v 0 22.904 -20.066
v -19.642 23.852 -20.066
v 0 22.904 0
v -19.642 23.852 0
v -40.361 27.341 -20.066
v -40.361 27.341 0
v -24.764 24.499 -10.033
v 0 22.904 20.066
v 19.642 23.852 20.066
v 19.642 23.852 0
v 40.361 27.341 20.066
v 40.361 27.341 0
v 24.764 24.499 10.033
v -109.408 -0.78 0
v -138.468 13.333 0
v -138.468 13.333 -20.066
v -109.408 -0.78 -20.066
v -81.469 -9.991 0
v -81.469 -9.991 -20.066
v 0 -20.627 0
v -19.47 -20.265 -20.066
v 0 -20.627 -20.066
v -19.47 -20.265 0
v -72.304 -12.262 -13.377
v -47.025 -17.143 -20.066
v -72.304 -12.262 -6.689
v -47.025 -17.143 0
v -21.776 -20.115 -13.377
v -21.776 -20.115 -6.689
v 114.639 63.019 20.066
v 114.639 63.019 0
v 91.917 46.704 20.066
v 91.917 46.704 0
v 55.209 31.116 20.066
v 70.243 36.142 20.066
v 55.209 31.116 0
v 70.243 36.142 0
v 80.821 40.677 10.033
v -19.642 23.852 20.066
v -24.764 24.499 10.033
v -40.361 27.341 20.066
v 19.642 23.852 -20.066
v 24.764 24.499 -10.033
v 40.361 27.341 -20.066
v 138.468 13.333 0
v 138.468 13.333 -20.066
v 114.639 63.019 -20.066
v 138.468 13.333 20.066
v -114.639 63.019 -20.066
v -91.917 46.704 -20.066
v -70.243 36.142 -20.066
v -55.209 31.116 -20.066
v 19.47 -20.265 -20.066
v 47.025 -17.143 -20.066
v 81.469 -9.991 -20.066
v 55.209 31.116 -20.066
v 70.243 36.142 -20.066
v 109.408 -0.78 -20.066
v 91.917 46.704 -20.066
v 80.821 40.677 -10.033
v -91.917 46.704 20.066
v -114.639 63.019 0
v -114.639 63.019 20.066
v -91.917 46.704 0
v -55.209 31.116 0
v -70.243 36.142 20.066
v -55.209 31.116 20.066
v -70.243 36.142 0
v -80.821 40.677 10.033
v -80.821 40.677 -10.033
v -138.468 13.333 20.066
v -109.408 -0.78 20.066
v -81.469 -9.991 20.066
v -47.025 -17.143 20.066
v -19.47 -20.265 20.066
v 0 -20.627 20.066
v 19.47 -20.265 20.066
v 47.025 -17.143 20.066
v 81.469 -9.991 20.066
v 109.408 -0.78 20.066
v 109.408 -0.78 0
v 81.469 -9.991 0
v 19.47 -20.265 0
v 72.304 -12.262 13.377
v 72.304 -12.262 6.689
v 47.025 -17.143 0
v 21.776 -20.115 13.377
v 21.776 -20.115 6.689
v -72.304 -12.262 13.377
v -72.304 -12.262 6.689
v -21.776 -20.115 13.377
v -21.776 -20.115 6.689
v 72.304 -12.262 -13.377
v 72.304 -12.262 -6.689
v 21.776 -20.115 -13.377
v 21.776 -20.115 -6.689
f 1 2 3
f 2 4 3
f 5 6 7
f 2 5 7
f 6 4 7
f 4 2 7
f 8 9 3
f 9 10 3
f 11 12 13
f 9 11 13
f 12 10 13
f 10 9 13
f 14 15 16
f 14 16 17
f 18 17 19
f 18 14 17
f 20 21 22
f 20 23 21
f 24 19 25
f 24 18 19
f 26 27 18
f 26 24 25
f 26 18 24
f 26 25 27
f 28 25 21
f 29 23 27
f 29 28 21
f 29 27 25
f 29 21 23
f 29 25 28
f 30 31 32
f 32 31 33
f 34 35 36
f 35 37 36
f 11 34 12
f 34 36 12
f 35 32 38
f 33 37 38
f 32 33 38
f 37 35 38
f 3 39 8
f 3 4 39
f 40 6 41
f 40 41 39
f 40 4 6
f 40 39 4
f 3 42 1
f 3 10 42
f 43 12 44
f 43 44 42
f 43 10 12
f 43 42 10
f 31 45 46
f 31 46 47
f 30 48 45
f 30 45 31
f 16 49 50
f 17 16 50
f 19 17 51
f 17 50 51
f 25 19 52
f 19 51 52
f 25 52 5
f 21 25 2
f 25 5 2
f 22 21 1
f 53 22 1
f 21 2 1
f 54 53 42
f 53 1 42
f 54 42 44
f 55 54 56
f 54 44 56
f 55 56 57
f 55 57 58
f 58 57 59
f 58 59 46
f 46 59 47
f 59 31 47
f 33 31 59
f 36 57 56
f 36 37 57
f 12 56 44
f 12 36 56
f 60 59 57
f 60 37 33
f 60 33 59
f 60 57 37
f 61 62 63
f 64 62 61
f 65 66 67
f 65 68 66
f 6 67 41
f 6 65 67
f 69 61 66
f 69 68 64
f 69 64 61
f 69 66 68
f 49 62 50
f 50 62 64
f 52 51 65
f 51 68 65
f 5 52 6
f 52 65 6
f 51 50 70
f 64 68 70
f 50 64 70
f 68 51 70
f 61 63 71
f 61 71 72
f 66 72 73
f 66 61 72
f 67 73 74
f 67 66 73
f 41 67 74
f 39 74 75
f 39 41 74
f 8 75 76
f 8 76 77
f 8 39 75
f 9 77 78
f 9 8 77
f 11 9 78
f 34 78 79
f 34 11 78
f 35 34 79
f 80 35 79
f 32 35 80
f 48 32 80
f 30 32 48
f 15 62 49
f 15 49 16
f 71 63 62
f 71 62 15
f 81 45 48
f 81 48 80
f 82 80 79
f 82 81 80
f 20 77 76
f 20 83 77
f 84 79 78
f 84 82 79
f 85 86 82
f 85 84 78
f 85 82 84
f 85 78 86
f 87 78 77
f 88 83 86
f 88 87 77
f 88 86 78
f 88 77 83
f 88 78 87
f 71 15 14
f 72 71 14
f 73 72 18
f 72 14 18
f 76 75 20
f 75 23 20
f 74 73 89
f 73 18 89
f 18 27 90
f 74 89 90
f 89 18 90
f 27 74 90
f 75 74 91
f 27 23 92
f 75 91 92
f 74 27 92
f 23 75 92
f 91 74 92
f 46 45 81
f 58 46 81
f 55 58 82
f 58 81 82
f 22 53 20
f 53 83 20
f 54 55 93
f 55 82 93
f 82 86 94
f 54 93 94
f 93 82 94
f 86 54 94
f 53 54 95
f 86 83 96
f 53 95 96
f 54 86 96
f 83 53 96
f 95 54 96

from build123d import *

# Parameters (mm, degrees)
F1_DEPTH = 20.066


with BuildPart() as f1:
    # F0 (on Top) → F1 (new body, symmetric)
    with BuildSketch(Plane.XY):
        with BuildLine():
            Line((-40.7400041414, 0), (-40.3613741967, 27.3410776708))
            add(Edge.make_bspline(
                [(-114.6393641829, 63.0186349154), (-107.418017227, 57.2504469564), (-85.8908182869, 39.927455403), (-53.4912257181, 30.2210678343), (-40.3613741967, 27.3410776708)],
                knots=[0, 0, 0, 0, 0.3353186726, 0.617259691, 0.617259691, 0.617259691, 0.617259691], degree=3))
            Line((-114.6393641829, 63.0186349154), (-138.4681090713, 13.3334891871))
            add(Edge.make_bspline(
                [(-138.4681090713, 13.3334891871), (-115.1514723897, 0), (-75.9728386276, -13.4036170026), (-22.9698172254, -20.889559513), (-6.5260122999, -20.6354582745), (0, -20.6269789487)],
                knots=[0, 0, 0, 0, 0.4161277079, 0.7694206845, 1, 1, 1, 1], degree=3))
            add(Edge.make_bspline(
                [(138.4681090713, 13.3334891871), (115.1514723897, 0), (75.9728386276, -13.4036170026), (22.9698172254, -20.889559513), (6.5260122999, -20.6354582745), (0, -20.6269789487)],
                knots=[0, 0, 0, 0, 0.4161277079, 0.7694206845, 1, 1, 1, 1], degree=3))
            Line((138.4681090713, 13.3334891871), (114.6393641829, 63.0186349154))
            add(Edge.make_bspline(
                [(114.6393641829, 63.0186349154), (107.418017227, 57.2504469564), (85.8908182869, 39.927455403), (53.4912257181, 30.2210678343), (40.3613741967, 27.3410776708)],
                knots=[0, 0, 0, 0, 0.3353186726, 0.617259691, 0.617259691, 0.617259691, 0.617259691], degree=3))
            Line((40.3613741967, 27.3410776708), (40.7400041414, 0))
            Line((40.7400041414, 0), (0, 0))
            Line((0, 0), (-40.7400041414, 0))
        make_face()
        with BuildLine():
            add(Edge.make_bspline(
                [(-40.3613741967, 27.3410776708), (-34.7559501325, 26.1115461609), (-17.8992406607, 23.1022563341), (-7.2161498025, 22.927924029), (0, 22.9036052665)],
                knots=[0.617259691, 0.617259691, 0.617259691, 0.617259691, 0.7376265486, 1, 1, 1, 1], degree=3))
            Line((-40.3613741967, 27.3410776708), (-40.7400041414, 0))
            Line((-40.7400041414, 0), (0, 0))
            Line((0, 0), (40.7400041414, 0))
            Line((40.7400041414, 0), (40.3613741967, 27.3410776708))
            add(Edge.make_bspline(
                [(40.3613741967, 27.3410776708), (34.7559501325, 26.1115461609), (17.8992406607, 23.1022563341), (7.2161498025, 22.927924029), (0, 22.9036052665)],
                knots=[0.617259691, 0.617259691, 0.617259691, 0.617259691, 0.7376265486, 1, 1, 1, 1], degree=3))
        make_face()
    extrude(amount=F1_DEPTH, both=True)


solid = f1.part
